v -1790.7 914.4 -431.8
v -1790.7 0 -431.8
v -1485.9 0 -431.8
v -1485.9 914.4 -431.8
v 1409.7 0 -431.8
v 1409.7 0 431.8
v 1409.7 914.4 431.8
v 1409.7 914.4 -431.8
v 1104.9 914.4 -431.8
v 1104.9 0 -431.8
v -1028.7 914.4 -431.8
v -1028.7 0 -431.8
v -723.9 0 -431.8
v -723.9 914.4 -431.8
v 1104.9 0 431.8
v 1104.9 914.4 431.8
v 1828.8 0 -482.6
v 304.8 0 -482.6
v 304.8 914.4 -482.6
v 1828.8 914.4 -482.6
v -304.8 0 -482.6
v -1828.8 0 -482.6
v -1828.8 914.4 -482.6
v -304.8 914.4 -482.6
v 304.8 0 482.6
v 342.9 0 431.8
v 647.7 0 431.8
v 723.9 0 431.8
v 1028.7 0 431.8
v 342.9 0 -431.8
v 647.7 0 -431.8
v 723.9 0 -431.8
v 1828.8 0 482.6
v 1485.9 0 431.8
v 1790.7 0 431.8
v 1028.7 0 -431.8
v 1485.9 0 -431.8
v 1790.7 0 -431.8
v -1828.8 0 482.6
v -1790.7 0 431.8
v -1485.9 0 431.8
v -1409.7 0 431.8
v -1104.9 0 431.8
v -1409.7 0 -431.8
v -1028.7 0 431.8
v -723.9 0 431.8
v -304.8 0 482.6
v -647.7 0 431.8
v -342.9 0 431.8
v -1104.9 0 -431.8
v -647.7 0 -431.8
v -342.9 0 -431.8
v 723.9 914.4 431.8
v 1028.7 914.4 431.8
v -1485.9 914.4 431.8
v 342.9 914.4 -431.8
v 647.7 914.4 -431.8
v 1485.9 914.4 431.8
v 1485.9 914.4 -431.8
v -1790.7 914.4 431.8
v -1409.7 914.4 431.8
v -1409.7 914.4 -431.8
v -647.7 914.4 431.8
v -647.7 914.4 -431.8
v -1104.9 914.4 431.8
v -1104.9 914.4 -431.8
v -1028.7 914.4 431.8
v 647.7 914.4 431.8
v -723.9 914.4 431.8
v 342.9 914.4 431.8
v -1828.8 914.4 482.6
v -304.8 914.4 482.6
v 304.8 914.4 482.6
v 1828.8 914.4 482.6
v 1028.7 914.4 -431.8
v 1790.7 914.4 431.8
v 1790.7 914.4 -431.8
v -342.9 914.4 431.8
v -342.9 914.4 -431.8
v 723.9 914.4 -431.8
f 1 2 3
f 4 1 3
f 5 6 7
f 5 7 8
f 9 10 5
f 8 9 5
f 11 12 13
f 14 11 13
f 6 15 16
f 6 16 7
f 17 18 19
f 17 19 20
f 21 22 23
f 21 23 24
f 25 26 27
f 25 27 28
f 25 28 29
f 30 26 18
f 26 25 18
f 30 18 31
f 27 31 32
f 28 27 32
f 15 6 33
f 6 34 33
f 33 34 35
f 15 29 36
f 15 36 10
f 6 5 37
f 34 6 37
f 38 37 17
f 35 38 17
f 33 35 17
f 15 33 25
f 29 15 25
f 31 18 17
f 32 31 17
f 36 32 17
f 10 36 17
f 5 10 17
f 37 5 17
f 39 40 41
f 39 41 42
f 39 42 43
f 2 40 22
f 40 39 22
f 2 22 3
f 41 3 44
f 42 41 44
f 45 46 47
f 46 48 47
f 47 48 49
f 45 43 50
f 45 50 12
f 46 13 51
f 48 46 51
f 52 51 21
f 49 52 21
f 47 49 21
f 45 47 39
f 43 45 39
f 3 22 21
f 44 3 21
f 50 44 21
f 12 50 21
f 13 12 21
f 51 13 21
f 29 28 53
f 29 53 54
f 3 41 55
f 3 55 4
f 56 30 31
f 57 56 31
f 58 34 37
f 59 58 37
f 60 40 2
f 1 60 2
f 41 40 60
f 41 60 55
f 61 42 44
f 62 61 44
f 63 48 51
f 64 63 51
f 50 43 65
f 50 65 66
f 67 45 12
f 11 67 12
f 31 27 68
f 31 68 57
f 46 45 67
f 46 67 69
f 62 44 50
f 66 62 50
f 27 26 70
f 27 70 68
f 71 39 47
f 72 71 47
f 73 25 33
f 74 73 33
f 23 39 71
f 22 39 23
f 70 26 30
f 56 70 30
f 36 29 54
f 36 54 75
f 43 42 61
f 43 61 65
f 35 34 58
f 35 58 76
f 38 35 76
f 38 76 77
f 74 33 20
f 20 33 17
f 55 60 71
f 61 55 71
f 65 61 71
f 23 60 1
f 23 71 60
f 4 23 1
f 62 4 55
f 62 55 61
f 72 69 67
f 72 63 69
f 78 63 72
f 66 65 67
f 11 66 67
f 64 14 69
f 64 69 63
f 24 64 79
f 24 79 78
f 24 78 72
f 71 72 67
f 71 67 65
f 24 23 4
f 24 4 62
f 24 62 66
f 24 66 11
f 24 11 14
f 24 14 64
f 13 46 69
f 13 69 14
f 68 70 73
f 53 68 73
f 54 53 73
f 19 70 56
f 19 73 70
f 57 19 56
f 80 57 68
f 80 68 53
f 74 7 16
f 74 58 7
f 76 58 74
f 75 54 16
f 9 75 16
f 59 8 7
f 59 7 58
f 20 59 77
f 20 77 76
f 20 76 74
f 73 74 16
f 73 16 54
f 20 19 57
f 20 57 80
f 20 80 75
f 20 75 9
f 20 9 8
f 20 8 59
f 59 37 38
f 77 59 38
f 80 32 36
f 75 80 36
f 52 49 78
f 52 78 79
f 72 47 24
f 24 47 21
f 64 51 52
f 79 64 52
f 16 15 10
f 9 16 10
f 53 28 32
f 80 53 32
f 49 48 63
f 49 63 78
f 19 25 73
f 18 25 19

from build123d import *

# Parameters (mm, degrees)
SKETCH1_W             = 1524
SKETCH1_H             = 965.2
SKETCH1_W_2           = 304.8
SKETCH1_H_2           = 863.6
BOSS_EXTRUDE2_DEPTH   = 914.4
BOSS_EXTRUDE2_2_DEPTH = 914.4


with BuildPart() as part:
    # Sketch1 → Boss-Extrude2 (new body)
    with BuildSketch(Plane(origin=(0, 0, 0), x_dir=(1, 0, 0), z_dir=(0, 1, 0))):
        with Locations((-1066.8, 0)):
            Rectangle(SKETCH1_W, SKETCH1_H)
        with Locations((-1638.3, 0)):
            Rectangle(SKETCH1_W_2, SKETCH1_H_2, mode=Mode.SUBTRACT)
        with Locations((-1257.3, 0)):
            Rectangle(SKETCH1_W_2, SKETCH1_H_2, mode=Mode.SUBTRACT)
        with Locations((-876.3, 0)):
            Rectangle(SKETCH1_W_2, SKETCH1_H_2, mode=Mode.SUBTRACT)
        with Locations((-495.3, 0)):
            Rectangle(SKETCH1_W_2, SKETCH1_H_2, mode=Mode.SUBTRACT)
    extrude(amount=BOSS_EXTRUDE2_DEPTH)


with BuildPart() as body_2:
    # Sketch1 → Boss-Extrude2 2 (new body)
    with BuildSketch(Plane(origin=(0, 0, 0), x_dir=(1, 0, 0), z_dir=(0, 1, 0))):
        with Locations((1066.8, 0)):
            Rectangle(SKETCH1_W, SKETCH1_H)
        with Locations((495.3, 0)):
            Rectangle(SKETCH1_W_2, SKETCH1_H_2, mode=Mode.SUBTRACT)
        with Locations((876.3, 0)):
            Rectangle(SKETCH1_W_2, SKETCH1_H_2, mode=Mode.SUBTRACT)
        with Locations((1257.3, 0)):
            Rectangle(SKETCH1_W_2, SKETCH1_H_2, mode=Mode.SUBTRACT)
        with Locations((1638.3, 0)):
            Rectangle(SKETCH1_W_2, SKETCH1_H_2, mode=Mode.SUBTRACT)
    extrude(amount=BOSS_EXTRUDE2_2_DEPTH)


solid = Compound([part.part, body_2.part])
